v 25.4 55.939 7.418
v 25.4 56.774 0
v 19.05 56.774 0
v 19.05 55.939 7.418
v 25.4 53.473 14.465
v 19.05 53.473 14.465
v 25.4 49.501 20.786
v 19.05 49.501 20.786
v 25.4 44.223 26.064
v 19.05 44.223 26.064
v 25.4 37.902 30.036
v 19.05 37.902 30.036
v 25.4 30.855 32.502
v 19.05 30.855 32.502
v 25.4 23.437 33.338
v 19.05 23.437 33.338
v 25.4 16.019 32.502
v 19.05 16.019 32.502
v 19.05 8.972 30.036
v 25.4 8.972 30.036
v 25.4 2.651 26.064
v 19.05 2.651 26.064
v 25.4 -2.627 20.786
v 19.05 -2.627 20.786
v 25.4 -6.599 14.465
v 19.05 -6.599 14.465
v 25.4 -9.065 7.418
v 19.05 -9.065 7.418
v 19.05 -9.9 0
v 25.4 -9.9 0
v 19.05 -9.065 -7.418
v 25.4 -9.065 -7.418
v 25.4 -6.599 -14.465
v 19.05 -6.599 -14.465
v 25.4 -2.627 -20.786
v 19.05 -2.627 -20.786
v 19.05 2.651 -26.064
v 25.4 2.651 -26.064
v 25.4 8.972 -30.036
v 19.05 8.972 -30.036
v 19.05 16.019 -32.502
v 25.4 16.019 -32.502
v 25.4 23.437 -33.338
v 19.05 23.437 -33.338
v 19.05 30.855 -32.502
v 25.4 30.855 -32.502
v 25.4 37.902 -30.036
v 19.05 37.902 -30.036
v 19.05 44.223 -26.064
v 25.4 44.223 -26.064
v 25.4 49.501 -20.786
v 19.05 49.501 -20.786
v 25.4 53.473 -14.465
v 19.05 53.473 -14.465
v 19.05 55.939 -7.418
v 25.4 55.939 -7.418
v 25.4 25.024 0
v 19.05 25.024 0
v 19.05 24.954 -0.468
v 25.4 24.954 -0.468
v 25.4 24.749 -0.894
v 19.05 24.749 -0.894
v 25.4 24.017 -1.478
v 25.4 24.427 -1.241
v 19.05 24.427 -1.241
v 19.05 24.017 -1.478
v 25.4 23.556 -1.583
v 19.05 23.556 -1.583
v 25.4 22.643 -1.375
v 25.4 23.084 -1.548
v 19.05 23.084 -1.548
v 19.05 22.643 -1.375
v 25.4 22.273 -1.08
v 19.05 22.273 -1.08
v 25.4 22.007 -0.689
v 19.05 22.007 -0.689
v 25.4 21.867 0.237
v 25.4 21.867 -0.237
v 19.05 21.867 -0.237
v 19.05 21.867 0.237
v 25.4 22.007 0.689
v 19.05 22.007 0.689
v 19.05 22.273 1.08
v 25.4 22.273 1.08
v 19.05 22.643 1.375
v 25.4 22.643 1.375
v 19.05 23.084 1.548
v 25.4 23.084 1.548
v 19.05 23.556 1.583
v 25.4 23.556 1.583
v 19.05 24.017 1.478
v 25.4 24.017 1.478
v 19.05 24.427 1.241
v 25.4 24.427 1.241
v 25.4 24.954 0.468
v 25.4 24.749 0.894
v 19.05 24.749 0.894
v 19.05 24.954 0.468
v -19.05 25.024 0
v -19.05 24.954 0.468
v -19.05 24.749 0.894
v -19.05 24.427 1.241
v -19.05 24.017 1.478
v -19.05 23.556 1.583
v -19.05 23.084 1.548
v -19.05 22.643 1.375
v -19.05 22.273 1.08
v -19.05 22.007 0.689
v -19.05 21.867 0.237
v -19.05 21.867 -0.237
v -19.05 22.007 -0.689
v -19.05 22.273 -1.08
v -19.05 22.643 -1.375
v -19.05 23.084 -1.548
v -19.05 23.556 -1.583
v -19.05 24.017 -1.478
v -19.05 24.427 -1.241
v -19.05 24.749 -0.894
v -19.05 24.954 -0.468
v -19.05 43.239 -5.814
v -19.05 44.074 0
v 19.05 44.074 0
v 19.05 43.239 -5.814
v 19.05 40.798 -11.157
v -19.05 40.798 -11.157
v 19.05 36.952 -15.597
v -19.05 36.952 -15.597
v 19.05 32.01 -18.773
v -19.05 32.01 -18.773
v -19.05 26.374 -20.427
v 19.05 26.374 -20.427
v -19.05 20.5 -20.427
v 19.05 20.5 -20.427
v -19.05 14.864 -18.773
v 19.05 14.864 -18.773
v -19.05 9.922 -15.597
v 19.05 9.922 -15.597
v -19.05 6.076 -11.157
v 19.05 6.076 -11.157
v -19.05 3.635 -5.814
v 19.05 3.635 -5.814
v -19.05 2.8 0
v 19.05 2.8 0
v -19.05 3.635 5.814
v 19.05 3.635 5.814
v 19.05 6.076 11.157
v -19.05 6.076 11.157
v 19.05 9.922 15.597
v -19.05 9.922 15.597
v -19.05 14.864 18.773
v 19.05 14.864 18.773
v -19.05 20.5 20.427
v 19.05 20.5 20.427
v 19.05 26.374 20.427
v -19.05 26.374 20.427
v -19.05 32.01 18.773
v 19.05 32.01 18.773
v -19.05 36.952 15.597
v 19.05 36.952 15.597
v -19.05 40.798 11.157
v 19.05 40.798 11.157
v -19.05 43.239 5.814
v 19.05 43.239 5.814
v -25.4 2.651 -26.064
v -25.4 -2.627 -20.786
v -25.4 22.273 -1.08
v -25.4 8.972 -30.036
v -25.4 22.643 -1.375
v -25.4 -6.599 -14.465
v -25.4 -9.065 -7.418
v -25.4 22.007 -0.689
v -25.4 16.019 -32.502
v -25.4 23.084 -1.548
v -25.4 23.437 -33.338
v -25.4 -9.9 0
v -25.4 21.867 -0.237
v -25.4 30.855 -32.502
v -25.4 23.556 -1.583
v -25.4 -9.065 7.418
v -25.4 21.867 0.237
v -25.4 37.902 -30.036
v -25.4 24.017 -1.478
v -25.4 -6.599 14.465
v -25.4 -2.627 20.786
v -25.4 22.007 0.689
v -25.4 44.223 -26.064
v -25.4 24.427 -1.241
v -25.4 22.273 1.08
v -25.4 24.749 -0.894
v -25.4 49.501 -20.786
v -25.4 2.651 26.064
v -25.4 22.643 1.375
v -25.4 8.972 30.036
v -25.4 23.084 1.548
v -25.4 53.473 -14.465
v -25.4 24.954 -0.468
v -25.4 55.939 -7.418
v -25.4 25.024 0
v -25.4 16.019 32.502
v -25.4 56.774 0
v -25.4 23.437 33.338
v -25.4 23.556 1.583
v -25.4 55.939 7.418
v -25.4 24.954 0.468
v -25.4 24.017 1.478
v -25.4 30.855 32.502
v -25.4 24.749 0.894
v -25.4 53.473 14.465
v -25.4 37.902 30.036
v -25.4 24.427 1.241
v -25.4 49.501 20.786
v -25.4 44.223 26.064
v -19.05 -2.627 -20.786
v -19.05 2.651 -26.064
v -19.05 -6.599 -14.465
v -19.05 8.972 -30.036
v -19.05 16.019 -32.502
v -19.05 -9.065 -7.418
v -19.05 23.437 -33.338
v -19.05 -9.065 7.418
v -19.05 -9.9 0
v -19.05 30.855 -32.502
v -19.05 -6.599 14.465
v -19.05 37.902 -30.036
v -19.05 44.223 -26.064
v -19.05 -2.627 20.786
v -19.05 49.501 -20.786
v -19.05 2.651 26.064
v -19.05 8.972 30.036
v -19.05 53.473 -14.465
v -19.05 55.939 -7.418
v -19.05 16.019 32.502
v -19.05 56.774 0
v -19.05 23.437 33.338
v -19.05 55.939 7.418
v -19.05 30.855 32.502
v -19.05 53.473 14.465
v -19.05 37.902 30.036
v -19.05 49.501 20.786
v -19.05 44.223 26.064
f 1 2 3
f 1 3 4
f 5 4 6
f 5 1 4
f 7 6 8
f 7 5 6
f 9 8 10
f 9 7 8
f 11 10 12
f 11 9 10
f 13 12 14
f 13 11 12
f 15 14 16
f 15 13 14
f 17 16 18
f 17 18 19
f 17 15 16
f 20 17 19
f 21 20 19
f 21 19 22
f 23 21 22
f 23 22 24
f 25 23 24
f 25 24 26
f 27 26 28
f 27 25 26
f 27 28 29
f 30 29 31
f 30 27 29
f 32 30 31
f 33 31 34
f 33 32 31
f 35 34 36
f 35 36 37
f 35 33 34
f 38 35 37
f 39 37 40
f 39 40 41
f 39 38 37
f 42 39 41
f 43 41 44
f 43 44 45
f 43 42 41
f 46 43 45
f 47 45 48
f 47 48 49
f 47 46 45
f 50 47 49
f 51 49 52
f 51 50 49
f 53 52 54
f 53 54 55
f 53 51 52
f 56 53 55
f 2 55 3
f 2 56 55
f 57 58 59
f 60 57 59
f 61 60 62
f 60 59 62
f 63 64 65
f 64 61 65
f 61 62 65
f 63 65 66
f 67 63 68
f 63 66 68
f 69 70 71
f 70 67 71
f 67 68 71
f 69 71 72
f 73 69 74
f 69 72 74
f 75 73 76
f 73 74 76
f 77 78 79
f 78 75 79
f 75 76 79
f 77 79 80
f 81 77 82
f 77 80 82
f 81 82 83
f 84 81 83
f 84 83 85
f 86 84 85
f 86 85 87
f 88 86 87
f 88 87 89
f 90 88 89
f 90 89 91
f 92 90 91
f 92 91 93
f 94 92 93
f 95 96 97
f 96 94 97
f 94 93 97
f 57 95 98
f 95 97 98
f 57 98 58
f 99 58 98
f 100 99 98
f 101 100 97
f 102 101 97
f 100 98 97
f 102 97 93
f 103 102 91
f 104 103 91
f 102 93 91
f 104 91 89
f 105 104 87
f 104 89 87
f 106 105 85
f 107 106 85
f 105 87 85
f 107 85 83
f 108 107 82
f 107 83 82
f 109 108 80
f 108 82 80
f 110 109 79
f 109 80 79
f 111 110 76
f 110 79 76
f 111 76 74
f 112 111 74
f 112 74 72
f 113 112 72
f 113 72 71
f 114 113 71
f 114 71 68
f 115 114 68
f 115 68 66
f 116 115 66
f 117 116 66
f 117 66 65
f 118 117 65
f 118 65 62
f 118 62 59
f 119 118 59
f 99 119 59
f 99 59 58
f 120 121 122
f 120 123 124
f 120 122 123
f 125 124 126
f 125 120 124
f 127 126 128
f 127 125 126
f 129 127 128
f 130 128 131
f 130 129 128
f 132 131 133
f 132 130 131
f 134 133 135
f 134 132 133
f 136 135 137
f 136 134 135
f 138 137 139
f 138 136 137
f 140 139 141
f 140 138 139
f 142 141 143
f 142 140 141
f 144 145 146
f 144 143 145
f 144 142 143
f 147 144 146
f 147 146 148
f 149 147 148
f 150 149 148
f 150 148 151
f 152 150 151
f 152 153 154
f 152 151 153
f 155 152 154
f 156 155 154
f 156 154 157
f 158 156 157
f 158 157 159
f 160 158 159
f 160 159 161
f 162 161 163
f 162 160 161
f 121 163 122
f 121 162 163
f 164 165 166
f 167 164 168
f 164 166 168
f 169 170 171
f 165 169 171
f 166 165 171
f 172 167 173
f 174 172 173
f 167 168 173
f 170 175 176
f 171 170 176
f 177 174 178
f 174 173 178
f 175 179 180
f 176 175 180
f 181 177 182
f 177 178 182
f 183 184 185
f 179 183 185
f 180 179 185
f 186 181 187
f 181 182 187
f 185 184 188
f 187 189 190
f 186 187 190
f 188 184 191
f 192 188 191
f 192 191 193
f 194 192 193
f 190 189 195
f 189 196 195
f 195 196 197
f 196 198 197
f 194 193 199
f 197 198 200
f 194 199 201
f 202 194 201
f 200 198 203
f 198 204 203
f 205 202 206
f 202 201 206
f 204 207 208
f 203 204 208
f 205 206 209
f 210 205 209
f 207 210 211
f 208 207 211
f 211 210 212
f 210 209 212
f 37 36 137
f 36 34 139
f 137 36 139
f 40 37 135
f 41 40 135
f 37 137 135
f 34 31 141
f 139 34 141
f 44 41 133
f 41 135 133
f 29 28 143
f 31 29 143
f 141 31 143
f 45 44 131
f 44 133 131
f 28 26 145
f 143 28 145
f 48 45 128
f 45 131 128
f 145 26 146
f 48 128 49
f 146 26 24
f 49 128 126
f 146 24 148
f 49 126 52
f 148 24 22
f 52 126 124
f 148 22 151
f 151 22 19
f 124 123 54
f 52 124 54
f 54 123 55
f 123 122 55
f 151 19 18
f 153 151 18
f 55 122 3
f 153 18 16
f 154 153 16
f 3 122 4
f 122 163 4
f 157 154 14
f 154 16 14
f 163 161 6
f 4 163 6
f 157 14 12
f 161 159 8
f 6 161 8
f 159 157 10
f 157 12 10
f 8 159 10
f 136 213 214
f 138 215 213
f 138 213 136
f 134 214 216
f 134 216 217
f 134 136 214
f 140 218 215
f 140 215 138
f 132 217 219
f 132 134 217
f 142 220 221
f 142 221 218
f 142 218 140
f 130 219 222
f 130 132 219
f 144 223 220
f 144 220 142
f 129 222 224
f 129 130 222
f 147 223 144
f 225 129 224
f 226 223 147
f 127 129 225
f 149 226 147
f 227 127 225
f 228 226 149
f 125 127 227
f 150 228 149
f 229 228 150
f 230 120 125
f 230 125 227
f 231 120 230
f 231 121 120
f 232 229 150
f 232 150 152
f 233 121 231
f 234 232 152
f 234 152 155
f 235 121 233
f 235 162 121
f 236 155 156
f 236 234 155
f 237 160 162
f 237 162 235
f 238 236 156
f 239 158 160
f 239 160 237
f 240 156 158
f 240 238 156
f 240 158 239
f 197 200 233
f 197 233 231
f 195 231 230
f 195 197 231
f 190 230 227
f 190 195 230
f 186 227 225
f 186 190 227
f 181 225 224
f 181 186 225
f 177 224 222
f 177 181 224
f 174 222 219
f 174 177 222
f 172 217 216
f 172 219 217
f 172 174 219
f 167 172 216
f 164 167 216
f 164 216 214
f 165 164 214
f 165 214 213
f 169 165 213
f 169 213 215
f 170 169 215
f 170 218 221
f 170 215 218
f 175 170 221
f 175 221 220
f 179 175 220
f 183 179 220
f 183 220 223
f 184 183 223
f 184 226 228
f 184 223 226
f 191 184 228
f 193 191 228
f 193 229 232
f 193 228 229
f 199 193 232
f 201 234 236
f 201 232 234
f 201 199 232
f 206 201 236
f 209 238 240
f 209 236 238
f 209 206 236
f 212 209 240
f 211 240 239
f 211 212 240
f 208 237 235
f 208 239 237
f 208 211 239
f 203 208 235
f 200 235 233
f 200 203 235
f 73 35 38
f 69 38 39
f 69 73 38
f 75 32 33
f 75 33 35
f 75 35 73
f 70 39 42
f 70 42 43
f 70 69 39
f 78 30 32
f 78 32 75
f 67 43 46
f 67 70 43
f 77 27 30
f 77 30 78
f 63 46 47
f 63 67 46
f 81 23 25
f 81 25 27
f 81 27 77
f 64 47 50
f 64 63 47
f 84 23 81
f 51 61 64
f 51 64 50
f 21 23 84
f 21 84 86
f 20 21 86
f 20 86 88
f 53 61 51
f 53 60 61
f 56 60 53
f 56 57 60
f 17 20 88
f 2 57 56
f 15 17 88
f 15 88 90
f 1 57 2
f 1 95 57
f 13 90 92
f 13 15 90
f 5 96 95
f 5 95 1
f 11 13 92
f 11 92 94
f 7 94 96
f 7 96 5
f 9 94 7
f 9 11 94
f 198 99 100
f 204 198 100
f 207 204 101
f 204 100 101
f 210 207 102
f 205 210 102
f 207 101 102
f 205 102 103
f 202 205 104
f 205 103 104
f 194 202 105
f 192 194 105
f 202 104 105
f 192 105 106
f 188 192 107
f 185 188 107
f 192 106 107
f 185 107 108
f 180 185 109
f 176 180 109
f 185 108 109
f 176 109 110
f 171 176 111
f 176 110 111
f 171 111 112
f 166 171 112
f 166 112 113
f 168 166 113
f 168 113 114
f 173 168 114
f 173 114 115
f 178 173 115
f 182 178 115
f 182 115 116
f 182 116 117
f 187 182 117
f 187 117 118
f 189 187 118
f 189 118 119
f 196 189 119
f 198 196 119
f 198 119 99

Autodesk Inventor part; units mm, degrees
ref_plane "YZ Plane" through (0, 0, 0) normal (1, 0, 0) x (0, 1, 0)
ref_plane "XZ Plane" through (0, 0, 0) normal (0, 1, 0) x (-1, 0, 0)
ref_plane "XY Plane" through (0, 0, 0) normal (0, 0, 1) x (1, 0, 0)
sketch "Sketch1" plane through (0, 0, 0) normal (0, 0, 1) x (1, 0, 0)
  line L0 (-19.05, 25.0245) -> (19.05, 25.0245)
  line L1 (19.05, 25.0245) -> (19.05, 44.0745)
  line L2 (19.05, 44.0745) -> (-19.05, 44.0745)
  line L3 (-19.05, 44.0745) -> (-19.05, 25.0245)
  line L4 (19.05, 56.7745) -> (25.4, 56.7745)
  line L5 (25.4, 56.7745) -> (25.4, 25.0245)
  line L6 (25.4, 25.0245) -> (19.05, 25.0245)
  line L7 (19.05, 25.0245) -> (19.05, 56.7745)
  line L8 (-19.05, 56.7745) -> (-25.4, 56.7745)
  line L9 (-25.4, 56.7745) -> (-25.4, 25.0245)
  line L10 (-25.4, 25.0245) -> (-19.05, 25.0245)
  line L11 (-19.05, 25.0245) -> (-19.05, 56.7745)
  line L12 (-27.7097, 23.437) -> (29.609, 23.437)
  point P0 (0, 0)
  dimension "d0" = 38.1
  dimension "d1" = 19.05
  dimension "d2" = 6.35
  dimension "d3" = 31.75
  dimension "d4" = 12.7
  dimension "d5" = 6.35
  dimension "d6" = 1.5875
  dimension "d8" = 31.75
revolve "Revolution1" add sketch "Sketch1" angle 360 about axis through (-27.7097, 23.437, 0) along (1, 0, 0)
properties part number "Spool"
